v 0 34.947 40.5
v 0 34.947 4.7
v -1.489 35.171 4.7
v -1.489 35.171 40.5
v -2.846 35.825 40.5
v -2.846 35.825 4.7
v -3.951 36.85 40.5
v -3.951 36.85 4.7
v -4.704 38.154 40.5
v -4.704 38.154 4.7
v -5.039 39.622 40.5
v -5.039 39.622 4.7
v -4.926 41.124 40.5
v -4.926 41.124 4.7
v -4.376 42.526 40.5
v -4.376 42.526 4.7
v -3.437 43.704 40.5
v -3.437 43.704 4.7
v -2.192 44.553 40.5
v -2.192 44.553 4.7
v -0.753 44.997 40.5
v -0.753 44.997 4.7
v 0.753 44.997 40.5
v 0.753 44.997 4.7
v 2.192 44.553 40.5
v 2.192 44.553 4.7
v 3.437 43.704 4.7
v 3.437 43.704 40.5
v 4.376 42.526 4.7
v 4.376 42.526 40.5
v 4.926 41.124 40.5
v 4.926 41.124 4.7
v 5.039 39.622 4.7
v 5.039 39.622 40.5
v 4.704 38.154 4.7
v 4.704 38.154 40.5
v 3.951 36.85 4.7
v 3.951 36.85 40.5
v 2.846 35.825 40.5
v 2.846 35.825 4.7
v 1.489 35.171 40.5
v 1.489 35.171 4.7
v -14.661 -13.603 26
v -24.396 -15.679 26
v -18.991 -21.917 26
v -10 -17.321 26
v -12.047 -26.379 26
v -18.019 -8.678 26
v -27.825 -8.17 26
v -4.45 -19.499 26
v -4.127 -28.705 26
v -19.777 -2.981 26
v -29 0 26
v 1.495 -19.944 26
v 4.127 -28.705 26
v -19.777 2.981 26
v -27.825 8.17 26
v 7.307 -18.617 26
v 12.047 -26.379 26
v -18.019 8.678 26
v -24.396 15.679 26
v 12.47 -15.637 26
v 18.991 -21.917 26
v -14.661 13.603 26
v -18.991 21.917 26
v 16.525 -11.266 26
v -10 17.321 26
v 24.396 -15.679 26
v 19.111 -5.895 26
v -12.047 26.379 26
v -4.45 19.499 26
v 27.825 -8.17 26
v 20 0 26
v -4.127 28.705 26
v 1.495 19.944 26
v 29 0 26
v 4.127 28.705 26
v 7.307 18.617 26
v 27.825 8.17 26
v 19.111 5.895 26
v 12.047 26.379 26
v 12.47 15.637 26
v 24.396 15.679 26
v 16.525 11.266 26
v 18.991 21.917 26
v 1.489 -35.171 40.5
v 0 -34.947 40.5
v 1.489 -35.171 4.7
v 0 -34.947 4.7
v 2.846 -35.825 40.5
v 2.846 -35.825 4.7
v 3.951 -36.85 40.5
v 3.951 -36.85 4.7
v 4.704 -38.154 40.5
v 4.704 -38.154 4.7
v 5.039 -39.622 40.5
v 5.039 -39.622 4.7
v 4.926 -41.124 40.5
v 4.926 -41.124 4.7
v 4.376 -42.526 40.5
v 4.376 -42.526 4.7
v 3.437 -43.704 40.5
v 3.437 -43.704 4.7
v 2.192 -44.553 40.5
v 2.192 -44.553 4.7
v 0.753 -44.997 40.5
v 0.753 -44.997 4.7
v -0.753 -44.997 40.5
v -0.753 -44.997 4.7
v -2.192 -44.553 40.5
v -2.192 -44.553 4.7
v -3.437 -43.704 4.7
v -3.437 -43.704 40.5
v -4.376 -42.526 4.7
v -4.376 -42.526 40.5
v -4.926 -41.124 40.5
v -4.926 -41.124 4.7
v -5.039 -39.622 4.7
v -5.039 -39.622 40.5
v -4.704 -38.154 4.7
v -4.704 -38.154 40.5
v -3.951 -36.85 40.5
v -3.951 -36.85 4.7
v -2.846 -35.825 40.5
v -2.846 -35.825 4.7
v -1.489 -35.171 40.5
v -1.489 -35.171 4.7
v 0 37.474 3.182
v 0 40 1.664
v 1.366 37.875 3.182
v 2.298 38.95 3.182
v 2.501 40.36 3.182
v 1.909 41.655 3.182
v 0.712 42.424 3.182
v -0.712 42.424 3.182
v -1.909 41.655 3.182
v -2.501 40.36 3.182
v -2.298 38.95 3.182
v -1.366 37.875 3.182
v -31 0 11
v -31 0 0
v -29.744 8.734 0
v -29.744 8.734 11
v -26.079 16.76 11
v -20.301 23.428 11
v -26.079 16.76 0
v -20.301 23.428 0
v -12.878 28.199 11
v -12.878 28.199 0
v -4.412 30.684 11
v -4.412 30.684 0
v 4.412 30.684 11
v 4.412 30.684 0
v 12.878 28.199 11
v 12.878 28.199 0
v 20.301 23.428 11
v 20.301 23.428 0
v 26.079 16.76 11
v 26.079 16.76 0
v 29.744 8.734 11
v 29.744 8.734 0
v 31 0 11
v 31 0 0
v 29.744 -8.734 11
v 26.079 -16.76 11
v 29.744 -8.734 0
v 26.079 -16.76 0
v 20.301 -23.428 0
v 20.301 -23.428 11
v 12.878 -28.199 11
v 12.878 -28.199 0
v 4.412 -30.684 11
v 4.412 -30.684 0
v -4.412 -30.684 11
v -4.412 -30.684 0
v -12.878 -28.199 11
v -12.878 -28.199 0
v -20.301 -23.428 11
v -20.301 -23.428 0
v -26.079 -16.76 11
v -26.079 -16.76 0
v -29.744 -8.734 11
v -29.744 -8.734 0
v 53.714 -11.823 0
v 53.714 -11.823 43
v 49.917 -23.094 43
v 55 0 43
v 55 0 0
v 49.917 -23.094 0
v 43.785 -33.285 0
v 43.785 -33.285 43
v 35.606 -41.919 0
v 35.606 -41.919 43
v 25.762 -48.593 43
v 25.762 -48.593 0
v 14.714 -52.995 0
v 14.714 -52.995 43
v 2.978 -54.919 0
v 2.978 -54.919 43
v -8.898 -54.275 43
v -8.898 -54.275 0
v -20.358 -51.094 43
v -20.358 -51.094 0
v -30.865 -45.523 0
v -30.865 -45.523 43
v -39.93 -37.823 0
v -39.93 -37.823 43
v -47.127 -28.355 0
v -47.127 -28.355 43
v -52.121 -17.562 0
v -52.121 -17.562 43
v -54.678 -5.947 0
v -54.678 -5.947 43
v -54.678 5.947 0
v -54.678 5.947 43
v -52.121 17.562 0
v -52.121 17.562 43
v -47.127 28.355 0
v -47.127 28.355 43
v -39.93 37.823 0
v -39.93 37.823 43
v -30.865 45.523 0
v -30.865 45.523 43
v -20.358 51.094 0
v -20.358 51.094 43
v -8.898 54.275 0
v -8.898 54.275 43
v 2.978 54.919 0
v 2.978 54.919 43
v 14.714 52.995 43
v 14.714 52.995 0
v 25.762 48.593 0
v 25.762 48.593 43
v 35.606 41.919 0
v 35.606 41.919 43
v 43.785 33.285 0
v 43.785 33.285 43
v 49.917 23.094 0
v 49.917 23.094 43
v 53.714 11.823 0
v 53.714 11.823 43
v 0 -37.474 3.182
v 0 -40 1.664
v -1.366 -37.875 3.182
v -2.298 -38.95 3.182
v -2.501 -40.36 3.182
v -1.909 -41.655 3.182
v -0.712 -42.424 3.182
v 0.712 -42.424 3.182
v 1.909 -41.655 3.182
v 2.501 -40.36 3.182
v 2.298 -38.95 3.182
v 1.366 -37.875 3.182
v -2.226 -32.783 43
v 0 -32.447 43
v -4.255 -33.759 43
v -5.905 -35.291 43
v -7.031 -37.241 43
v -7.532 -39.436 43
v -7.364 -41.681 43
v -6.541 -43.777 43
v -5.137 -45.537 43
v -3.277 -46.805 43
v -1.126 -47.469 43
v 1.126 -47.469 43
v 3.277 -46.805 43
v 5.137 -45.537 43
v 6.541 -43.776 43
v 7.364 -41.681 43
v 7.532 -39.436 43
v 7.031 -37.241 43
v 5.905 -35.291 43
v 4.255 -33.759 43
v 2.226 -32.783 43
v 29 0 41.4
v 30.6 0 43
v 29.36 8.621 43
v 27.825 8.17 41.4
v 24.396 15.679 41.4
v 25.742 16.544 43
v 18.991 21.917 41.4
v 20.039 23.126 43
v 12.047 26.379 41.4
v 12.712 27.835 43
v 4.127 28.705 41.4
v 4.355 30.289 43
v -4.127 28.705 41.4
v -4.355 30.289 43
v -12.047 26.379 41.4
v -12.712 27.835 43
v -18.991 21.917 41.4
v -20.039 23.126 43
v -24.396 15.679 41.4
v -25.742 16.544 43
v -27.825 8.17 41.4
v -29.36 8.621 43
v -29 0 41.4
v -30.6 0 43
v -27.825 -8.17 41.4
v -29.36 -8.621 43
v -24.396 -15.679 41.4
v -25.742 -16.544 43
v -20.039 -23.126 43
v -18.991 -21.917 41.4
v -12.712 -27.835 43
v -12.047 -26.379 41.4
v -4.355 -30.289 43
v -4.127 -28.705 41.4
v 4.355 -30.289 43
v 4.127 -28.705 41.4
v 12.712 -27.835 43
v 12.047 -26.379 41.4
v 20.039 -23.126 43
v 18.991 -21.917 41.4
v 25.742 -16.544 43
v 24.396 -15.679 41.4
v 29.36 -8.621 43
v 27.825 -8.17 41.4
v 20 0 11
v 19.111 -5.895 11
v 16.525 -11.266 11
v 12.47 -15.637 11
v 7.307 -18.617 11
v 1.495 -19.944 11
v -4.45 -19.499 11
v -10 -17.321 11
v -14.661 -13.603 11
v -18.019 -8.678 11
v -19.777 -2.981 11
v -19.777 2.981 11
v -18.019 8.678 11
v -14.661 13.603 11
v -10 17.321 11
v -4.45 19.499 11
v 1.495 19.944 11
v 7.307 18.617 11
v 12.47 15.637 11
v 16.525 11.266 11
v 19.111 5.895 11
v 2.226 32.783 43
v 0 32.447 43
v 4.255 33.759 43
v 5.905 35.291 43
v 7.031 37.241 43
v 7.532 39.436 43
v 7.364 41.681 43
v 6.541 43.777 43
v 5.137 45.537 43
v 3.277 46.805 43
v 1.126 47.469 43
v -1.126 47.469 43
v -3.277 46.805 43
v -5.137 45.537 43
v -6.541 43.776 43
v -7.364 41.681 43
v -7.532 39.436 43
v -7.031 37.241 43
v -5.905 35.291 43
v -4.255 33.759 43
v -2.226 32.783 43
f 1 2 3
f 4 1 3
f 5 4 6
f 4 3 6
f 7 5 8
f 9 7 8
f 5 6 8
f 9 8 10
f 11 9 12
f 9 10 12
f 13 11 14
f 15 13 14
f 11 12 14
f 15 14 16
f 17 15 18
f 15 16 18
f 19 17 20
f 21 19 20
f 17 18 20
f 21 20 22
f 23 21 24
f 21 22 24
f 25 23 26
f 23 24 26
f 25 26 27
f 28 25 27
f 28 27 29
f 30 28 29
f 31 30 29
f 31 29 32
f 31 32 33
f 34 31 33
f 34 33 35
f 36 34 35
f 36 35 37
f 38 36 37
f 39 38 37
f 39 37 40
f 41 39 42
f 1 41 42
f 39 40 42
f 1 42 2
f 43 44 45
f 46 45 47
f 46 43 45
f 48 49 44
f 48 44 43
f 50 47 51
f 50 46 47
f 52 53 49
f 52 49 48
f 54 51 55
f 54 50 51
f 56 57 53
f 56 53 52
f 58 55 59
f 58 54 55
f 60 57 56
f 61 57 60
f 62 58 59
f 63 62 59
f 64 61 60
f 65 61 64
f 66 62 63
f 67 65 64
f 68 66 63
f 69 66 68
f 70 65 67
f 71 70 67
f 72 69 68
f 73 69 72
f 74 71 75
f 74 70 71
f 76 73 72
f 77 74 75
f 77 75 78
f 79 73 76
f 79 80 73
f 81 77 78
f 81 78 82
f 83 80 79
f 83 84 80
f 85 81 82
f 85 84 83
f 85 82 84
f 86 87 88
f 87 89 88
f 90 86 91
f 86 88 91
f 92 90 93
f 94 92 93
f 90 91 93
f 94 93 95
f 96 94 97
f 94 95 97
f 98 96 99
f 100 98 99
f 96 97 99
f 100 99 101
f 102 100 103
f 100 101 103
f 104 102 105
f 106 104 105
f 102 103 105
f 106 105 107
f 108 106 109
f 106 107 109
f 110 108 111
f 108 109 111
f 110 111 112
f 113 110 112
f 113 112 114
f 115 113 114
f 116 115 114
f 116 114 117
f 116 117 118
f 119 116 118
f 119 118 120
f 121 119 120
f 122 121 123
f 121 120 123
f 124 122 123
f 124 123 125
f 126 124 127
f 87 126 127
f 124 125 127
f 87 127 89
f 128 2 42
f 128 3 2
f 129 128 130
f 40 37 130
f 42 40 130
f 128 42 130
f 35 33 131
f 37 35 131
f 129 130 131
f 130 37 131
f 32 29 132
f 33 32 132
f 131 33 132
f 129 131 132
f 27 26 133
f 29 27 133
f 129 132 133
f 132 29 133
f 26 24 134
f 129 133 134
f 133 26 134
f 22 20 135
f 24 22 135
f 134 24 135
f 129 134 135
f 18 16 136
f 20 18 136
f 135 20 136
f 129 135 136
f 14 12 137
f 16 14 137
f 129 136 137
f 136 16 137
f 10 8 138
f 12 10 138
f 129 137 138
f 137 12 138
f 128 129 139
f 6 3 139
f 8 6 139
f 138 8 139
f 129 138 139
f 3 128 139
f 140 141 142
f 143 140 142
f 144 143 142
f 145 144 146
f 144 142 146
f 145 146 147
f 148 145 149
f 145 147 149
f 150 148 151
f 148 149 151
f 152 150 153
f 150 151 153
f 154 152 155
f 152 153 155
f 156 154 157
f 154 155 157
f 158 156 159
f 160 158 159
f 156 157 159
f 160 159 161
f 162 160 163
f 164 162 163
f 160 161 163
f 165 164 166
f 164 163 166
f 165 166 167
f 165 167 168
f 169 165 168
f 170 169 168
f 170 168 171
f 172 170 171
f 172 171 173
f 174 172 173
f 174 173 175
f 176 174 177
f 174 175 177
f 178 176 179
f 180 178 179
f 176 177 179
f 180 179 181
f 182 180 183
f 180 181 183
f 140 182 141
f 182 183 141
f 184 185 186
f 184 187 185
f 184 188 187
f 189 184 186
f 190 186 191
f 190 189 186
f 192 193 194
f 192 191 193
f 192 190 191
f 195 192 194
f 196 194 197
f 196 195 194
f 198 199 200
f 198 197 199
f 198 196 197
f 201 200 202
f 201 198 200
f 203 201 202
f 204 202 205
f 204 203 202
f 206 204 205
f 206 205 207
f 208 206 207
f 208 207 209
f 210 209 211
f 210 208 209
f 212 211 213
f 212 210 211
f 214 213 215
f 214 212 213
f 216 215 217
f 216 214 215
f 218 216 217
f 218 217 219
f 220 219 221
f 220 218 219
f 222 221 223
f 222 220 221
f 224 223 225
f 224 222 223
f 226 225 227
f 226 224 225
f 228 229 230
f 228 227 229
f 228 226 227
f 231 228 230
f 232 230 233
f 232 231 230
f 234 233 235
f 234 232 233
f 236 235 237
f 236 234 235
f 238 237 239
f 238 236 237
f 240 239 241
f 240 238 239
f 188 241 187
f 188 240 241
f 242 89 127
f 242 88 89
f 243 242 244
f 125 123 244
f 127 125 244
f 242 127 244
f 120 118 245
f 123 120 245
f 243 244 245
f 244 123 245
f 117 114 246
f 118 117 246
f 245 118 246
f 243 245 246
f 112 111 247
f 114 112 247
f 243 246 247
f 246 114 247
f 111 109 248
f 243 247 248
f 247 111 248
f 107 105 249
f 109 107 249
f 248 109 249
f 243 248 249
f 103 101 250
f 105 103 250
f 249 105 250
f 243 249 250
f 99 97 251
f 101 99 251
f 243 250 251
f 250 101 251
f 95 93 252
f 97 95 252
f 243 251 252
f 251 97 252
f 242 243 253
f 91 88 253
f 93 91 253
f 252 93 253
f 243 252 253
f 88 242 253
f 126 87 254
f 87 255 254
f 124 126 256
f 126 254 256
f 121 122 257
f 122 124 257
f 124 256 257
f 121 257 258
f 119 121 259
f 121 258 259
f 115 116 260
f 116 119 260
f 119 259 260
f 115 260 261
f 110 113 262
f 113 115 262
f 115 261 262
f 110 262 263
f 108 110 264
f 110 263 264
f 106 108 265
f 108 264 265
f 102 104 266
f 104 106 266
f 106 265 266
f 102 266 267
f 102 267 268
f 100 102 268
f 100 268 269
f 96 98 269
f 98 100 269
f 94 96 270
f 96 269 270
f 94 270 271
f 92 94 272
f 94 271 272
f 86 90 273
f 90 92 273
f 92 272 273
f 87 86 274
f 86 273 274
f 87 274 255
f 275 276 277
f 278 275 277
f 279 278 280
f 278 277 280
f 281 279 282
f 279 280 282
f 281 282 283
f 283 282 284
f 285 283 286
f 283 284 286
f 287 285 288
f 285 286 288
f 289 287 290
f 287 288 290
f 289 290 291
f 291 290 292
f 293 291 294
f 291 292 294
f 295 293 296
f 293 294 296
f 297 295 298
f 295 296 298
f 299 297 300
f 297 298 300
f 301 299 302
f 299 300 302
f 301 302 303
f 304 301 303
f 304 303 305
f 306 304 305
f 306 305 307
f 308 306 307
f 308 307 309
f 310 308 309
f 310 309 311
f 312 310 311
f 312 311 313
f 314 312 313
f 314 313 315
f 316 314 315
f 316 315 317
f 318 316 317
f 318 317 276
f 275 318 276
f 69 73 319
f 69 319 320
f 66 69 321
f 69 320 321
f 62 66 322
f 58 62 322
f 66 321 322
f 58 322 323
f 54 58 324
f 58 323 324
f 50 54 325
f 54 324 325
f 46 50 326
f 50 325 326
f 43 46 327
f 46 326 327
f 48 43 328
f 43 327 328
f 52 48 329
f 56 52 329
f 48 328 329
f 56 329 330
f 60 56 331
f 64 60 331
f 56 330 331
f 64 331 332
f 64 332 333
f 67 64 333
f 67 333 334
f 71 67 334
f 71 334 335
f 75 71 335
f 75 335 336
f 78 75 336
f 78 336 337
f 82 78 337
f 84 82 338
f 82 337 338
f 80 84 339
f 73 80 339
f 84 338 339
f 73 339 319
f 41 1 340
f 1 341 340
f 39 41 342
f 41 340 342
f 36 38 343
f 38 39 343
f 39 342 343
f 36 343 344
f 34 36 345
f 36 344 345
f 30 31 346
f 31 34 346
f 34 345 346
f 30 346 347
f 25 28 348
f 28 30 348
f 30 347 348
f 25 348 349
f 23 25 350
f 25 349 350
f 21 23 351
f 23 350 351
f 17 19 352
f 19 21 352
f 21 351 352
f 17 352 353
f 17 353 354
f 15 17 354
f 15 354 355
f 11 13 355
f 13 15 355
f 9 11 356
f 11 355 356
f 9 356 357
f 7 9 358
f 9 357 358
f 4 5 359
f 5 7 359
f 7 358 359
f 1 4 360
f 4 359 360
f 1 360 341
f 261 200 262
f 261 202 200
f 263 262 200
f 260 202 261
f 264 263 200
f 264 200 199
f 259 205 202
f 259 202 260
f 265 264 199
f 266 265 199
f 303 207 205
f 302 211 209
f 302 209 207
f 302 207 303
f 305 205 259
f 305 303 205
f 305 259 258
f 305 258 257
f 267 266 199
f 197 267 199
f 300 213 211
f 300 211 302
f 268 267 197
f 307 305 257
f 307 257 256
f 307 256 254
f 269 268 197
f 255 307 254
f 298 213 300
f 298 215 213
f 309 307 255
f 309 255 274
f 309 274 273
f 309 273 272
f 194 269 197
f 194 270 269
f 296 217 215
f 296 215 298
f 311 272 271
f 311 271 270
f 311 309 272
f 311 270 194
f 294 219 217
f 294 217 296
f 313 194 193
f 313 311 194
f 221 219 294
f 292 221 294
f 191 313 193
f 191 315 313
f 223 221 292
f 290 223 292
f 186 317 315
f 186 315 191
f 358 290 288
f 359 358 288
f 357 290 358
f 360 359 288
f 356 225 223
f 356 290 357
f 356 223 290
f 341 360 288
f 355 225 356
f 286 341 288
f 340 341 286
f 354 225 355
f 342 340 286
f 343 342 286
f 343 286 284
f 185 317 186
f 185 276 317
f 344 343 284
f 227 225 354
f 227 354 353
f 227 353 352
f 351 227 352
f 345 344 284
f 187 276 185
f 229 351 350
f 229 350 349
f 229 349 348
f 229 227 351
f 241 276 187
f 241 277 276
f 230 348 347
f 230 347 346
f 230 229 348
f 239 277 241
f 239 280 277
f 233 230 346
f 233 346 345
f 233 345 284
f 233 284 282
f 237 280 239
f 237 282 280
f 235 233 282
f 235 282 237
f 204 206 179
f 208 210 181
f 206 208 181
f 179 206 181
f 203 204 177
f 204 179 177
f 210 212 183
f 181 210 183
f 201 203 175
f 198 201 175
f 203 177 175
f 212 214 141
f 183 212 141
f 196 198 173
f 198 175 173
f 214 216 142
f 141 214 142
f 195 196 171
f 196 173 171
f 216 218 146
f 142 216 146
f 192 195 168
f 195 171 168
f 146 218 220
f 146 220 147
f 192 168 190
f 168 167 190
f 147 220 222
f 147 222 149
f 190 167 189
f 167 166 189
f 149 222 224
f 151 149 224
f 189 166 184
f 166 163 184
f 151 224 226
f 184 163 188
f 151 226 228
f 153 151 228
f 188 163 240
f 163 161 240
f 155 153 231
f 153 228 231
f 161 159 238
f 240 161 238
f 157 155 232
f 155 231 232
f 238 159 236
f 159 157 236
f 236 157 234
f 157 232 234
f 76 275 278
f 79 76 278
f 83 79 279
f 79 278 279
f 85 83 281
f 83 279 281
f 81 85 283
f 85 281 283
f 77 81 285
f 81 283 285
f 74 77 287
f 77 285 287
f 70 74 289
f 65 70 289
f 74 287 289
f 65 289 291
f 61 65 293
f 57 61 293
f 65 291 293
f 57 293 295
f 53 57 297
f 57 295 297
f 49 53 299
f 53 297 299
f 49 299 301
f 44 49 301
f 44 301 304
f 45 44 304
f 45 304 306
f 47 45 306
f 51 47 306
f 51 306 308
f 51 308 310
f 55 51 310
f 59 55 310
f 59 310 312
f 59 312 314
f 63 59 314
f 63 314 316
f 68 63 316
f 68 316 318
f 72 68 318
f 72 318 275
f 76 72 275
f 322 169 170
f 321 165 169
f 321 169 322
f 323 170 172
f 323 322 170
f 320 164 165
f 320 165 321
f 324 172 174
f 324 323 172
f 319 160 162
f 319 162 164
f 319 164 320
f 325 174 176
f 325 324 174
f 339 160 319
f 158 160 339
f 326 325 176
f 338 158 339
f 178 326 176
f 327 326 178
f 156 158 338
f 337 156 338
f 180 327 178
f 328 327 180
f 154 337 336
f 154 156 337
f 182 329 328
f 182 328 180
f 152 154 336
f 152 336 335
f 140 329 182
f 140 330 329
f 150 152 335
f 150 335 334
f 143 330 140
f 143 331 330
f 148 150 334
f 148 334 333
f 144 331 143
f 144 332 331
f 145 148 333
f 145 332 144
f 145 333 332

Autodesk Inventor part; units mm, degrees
ref_plane "YZ Plane" through (0, 0, 0) normal (1, 0, 0) x (0, 1, 0)
ref_plane "XZ Plane" through (0, 0, 0) normal (0, 1, 0) x (-1, 0, 0)
ref_plane "XY Plane" through (0, 0, 0) normal (0, 0, 1) x (1, 0, 0)
sketch "Эскиз1" plane through (0, 0, 0) normal (0, 0, 1) x (1, 0, 0)
  circle A0 centre (0, 0) radius 55
  circle A1 centre (0, 0) radius 20
  dimension "d0" = 110
  dimension "d1" = 40
extrude "Выдавливание1" add sketch "Эскиз1" along normal blind 43
sketch "Эскиз2" plane through (0, 0, 43) normal (0, 0, 1) x (1, 0, 0)
  circle A0 centre (0, 0) radius 55 projected
  circle A1 centre (0, 0) radius 29
  dimension "d6" = 58
extrude "Выдавливание2" cut sketch "Эскиз2" against normal blind 17 contours A1
sketch "Эскиз3" plane through (0, 0, 0) normal (0, 0, -1) x (-1, 0, 0)
  circle A0 centre (0, 0) radius 31
  dimension "d9" = 62
extrude "Выдавливание3" cut sketch "Эскиз3" against normal blind 11
sketch "Эскиз4" plane through (0, 0, 43) normal (0, 0, 1) x (1, 0, 0)
  circle A0 centre (0, 0) radius 40
  line L0 (0, 0) -> (0, 40)
  circle A1 centre (0, 0) radius 55 projected
  dimension "d12" = 80
hole "Отверстие1" at (0, 40, 43) direction (0, 0, -1) diameter 10.106 depth 38.3 tip angle 118 thread size "M12x1.75" class "6H" standard "ANSI Metric M Profile"
pattern_circular "Круговой массив1" count 2 over 360 about axis through (0, 0, 11) along (0, 0, -1) of "Отверстие1"
chamfer "Фаска2" distance 1.6 angle 45 1 edges at (-29, 0, 43)
chamfer "Фаска3" distance 2.5 angle 45 2 edges at (0, 45.053, 43) (0, -45.053, 43)
sketch "Эскиз5" plane through (0, 0, 43) normal (0, 0, 1) x (1, 0, 0)
  point P0 (0, 40)
  point P1 (-62.4077, 41.077)
properties part number "Корпус"
